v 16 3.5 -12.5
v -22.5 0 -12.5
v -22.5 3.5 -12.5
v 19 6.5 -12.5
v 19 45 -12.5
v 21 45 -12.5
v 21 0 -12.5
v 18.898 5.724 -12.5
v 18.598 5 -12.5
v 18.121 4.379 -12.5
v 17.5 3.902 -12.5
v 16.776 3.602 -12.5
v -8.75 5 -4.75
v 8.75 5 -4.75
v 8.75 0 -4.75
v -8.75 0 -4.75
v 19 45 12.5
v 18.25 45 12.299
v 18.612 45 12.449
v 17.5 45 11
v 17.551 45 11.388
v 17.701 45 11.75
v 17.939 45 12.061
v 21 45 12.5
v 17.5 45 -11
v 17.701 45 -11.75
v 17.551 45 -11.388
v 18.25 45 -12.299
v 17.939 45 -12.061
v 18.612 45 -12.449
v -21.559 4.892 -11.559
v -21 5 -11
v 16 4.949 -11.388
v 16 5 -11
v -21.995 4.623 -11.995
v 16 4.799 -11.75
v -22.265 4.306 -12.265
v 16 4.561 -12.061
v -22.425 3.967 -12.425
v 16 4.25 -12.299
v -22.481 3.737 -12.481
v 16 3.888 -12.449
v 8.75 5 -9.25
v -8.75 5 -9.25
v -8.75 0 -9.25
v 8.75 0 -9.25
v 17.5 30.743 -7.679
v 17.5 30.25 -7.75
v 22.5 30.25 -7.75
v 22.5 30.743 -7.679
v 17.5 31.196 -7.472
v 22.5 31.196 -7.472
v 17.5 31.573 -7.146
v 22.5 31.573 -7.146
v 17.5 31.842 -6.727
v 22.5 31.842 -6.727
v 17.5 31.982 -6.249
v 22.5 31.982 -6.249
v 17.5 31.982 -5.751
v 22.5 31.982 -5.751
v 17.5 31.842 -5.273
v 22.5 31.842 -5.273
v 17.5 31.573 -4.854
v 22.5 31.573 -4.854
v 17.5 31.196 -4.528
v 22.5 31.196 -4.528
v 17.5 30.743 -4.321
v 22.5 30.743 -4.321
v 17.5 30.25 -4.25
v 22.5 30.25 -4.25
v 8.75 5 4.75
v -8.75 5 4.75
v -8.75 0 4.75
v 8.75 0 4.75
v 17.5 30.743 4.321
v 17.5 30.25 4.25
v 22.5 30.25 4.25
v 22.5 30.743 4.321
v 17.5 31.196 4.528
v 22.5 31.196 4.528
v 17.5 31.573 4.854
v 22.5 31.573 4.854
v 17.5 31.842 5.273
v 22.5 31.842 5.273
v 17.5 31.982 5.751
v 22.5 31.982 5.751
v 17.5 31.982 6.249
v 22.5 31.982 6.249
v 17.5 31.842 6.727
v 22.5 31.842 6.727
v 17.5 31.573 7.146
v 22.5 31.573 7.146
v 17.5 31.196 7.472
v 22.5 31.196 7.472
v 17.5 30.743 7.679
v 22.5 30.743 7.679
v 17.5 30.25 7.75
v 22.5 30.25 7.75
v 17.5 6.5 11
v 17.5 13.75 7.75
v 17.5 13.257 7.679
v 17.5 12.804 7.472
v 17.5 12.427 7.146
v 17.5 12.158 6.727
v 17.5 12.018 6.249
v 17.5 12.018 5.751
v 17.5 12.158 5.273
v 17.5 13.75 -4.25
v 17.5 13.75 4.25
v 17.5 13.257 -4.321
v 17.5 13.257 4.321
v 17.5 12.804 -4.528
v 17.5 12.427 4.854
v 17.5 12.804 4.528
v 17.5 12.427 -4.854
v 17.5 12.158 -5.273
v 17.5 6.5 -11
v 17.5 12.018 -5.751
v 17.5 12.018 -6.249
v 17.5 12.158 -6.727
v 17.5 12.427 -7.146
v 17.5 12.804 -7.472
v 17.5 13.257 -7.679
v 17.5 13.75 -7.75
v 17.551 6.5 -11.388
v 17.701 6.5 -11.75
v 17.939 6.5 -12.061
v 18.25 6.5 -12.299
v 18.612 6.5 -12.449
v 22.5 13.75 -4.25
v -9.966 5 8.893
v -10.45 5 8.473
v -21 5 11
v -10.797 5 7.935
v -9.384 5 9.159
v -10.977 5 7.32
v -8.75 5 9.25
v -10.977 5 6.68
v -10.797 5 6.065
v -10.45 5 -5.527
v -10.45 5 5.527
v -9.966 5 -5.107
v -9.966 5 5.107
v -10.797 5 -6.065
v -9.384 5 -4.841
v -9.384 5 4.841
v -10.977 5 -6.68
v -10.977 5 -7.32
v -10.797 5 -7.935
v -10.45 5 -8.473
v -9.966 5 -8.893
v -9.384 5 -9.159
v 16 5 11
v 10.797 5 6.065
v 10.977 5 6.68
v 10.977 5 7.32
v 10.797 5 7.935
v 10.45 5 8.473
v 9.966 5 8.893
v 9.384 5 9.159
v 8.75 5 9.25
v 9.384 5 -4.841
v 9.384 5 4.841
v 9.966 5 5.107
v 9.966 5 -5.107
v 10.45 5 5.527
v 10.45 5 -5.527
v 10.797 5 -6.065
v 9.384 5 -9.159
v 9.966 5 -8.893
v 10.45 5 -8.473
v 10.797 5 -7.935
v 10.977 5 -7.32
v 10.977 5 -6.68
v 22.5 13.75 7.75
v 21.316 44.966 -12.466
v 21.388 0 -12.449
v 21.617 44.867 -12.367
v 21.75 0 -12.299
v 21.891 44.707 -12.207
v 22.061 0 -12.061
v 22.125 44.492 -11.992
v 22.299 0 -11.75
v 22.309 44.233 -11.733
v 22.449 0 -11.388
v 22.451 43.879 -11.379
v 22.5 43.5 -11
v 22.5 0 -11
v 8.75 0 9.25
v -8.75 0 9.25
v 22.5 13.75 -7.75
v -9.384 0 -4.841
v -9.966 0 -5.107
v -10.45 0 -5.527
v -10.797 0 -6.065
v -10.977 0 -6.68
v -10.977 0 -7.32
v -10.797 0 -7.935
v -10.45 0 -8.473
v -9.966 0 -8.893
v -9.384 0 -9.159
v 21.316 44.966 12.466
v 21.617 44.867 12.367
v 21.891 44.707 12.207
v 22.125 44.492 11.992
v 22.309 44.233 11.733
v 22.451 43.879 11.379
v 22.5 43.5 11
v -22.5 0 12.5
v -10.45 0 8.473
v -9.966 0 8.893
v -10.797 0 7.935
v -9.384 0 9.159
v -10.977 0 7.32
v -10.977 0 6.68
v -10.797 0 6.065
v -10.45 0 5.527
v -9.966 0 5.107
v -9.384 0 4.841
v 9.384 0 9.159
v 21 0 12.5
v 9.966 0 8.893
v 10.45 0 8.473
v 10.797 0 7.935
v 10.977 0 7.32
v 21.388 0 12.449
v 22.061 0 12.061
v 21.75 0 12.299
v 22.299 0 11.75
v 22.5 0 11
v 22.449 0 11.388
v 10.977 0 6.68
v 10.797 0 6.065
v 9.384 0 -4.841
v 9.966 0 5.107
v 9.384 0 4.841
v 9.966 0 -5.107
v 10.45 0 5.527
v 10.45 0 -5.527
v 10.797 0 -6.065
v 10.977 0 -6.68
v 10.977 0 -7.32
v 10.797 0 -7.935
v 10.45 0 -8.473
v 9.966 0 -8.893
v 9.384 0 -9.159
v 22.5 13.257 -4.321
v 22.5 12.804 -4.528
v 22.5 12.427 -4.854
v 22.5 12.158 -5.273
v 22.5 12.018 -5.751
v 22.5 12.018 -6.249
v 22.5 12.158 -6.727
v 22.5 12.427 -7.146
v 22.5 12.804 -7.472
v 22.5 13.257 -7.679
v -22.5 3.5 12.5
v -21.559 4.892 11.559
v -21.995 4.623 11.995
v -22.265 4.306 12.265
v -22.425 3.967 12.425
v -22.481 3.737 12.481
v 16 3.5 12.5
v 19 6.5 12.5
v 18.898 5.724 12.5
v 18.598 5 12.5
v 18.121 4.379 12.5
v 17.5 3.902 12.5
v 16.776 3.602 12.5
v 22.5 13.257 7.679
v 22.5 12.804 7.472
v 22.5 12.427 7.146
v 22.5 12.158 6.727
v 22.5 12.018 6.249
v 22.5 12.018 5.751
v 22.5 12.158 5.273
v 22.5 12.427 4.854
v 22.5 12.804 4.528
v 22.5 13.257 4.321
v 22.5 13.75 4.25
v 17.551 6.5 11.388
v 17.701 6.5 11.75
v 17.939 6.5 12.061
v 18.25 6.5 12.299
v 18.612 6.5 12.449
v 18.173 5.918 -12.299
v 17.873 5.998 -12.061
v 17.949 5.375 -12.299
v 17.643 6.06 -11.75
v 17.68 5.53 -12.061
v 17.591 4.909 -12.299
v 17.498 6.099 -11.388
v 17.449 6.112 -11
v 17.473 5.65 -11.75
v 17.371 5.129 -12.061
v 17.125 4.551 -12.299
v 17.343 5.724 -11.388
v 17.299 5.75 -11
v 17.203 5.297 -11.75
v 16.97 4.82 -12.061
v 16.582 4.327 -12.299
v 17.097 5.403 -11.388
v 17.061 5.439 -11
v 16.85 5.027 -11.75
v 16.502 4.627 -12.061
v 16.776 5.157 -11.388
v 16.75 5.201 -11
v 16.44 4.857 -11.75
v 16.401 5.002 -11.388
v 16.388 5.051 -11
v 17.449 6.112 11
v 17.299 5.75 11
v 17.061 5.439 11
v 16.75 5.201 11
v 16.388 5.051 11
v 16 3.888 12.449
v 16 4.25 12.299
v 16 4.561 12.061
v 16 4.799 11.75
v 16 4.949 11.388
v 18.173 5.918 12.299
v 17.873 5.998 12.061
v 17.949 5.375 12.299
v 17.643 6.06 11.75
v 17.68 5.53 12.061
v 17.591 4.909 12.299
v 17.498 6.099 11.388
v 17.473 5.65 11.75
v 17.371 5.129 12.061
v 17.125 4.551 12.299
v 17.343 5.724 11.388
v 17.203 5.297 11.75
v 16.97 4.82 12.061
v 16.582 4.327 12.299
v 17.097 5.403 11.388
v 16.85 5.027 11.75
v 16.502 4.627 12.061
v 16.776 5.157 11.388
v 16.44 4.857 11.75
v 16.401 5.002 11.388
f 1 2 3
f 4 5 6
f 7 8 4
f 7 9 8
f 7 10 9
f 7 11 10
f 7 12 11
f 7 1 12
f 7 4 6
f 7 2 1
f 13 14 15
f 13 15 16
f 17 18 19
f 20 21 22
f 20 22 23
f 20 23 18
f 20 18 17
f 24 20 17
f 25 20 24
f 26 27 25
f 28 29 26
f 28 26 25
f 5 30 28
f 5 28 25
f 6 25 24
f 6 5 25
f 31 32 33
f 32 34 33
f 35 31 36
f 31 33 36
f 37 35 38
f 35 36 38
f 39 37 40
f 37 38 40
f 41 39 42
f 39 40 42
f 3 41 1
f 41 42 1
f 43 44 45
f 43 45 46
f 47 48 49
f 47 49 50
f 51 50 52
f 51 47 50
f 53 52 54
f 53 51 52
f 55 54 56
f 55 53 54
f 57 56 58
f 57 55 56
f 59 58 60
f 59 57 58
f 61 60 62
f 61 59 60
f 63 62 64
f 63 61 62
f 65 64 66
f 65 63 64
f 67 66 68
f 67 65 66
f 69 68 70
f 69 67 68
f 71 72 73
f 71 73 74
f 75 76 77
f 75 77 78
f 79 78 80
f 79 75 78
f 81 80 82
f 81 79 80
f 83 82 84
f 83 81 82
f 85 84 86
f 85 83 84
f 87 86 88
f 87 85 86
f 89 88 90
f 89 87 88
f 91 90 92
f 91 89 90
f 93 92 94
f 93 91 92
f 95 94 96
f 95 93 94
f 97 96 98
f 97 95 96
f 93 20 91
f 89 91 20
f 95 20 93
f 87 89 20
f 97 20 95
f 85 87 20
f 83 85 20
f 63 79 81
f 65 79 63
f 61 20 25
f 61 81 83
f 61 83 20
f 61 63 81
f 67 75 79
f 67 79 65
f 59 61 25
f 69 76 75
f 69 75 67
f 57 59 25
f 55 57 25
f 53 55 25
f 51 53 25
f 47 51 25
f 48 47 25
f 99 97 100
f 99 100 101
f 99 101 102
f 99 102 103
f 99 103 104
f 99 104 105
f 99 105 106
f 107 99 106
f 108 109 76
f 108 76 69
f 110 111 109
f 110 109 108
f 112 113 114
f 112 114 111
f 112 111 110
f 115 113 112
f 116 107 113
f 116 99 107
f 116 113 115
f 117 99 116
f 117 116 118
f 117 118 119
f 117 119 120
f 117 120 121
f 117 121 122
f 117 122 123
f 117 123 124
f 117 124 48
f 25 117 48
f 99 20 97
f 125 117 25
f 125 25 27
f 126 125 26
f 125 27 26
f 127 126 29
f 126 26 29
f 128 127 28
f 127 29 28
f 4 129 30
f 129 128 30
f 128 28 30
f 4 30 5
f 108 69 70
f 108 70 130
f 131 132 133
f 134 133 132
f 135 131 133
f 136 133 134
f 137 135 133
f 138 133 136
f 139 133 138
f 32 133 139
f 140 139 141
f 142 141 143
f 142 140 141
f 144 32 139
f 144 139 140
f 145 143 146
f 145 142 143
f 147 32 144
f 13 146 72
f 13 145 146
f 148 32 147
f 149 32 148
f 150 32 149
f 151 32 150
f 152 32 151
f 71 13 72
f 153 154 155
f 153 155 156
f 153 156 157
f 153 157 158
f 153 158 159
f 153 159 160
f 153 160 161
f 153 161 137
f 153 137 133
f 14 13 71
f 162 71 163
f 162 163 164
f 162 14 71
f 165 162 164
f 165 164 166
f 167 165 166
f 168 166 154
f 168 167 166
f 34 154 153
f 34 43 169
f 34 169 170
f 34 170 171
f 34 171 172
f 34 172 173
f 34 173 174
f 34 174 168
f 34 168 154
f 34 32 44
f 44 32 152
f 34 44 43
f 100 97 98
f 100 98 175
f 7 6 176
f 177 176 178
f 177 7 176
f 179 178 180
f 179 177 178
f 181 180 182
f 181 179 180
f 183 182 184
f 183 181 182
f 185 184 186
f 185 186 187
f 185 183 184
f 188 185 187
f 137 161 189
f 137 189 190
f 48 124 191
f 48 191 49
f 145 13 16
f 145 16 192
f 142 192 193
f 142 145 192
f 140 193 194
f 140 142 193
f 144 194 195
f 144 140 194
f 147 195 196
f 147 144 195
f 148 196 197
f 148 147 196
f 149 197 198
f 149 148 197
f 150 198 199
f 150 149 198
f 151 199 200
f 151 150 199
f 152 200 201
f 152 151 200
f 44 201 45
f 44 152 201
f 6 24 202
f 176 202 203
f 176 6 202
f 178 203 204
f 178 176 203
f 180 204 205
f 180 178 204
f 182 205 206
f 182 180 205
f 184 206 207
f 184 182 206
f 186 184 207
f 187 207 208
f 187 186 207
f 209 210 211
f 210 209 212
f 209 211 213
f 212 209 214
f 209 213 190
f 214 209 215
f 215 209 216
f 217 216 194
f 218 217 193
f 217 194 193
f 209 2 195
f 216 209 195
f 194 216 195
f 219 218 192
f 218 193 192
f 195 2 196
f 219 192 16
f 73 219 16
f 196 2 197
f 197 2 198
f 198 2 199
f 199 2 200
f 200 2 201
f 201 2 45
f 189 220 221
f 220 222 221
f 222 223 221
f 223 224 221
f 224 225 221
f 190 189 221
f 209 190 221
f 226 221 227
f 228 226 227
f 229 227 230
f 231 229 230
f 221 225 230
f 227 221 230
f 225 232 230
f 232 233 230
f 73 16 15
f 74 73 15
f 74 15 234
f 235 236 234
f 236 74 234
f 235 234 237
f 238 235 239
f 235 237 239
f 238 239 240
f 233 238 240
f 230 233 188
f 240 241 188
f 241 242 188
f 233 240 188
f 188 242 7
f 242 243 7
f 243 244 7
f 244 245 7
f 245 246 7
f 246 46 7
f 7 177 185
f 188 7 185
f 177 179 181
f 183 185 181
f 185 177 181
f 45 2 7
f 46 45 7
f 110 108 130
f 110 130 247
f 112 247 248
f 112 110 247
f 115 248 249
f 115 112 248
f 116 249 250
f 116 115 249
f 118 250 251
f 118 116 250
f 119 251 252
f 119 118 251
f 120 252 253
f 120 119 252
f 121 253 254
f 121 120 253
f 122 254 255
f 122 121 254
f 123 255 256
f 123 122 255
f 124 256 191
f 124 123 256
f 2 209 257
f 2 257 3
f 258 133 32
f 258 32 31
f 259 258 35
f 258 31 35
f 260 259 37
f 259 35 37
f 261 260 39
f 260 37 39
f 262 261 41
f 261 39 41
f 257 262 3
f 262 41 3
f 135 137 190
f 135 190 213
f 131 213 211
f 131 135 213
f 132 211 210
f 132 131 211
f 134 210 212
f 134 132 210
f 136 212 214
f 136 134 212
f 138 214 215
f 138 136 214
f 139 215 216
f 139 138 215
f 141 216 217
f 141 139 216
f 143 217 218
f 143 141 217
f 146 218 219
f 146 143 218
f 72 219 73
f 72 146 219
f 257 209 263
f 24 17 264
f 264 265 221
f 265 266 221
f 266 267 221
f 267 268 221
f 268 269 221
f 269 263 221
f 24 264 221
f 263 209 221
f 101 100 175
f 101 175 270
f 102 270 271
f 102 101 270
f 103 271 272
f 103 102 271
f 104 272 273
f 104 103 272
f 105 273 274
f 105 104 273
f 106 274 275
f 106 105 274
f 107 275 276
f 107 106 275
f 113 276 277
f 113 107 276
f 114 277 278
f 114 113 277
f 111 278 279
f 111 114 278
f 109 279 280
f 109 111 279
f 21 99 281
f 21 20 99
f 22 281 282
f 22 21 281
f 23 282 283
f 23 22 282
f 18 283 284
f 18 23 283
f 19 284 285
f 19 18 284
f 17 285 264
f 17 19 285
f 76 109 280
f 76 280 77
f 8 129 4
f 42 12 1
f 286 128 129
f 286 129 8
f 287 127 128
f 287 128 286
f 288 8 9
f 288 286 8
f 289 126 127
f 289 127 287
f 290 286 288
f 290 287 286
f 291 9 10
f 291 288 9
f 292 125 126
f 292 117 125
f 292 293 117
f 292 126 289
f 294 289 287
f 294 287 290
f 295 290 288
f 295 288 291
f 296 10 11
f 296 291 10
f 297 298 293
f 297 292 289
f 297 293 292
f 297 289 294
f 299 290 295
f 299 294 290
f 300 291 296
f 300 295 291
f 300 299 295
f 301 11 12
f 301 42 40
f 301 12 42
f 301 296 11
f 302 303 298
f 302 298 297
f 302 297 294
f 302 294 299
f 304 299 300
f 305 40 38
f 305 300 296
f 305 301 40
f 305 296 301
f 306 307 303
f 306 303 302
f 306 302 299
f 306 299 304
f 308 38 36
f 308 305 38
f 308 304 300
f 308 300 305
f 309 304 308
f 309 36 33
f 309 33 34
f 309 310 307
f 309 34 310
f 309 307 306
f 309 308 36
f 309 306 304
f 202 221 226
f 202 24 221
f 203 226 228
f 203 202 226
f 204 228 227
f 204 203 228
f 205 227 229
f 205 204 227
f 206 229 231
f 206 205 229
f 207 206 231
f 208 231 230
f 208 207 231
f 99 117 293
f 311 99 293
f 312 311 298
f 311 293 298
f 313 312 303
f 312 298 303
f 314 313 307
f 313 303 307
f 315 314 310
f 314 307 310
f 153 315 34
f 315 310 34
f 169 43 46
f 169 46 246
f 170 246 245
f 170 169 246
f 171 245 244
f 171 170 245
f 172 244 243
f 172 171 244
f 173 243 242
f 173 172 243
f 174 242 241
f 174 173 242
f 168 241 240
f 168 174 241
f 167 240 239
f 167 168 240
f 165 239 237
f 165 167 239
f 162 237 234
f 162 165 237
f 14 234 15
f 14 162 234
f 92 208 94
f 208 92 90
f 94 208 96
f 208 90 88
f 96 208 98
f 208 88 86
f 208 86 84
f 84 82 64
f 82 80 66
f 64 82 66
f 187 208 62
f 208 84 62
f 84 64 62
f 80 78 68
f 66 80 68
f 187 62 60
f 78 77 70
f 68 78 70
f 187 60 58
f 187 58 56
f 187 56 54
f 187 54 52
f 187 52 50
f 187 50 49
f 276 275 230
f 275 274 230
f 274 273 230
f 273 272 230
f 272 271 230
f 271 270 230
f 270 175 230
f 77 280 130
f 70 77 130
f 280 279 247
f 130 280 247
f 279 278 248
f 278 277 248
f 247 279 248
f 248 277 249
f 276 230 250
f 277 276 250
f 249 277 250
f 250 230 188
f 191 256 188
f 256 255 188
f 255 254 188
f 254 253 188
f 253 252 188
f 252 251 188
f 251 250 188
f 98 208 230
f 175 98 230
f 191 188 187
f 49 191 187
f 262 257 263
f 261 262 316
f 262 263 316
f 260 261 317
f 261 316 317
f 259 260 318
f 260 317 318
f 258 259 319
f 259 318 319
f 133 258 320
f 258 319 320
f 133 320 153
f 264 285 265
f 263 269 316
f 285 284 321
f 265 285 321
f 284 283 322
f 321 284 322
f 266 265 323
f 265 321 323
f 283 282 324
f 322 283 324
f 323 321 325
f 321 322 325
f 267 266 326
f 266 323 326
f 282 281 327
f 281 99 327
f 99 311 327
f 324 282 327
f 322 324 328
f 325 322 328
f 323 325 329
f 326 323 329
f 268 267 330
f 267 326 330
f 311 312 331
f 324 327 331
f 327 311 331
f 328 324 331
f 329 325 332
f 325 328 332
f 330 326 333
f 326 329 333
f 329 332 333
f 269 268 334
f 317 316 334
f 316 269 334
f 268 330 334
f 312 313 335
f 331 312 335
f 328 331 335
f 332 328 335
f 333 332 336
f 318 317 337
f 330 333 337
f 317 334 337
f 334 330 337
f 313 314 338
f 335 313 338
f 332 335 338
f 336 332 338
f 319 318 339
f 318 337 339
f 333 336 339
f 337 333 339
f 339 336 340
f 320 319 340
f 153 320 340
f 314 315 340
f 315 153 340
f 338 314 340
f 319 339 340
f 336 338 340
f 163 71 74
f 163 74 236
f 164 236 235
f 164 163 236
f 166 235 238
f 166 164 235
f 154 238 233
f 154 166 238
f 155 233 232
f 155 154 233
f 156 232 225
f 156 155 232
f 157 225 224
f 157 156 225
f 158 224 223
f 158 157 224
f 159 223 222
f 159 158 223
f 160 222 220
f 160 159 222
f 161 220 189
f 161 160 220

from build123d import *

# Parameters (mm, degrees)
SKETCH2_W           = 45
SKETCH2_H           = 25
BOSS_EXTRUDE1_DEPTH = 5
CUT_EXTRUDE1_DEPTH  = 27.220221204
SKETCH5_W           = 5
SKETCH5_H           = 25
BOSS_EXTRUDE2_DEPTH = 40
CUT_EXTRUDE2_DEPTH  = 62.491869381
FILLET2_R           = 1.5


with BuildPart() as part:
    # Sketch2 → Boss-Extrude1 (new body)
    with BuildSketch(Plane(origin=(0, 0, 0), x_dir=(1, 0, 0), z_dir=(0, 1, 0))):
        Rectangle(SKETCH2_W, SKETCH2_H)
    extrude(amount=BOSS_EXTRUDE1_DEPTH)

    # Sketch3 → Cut-Extrude1 (cut, through all)
    with BuildSketch(Plane(origin=(0, 5, 0), x_dir=(1, 0, 0), z_dir=(0, 1, 0))):
        with BuildLine():
            Line((-8.75, 9.25), (8.75, 9.25))
            ThreePointArc((8.75, 9.25), (11, 7), (8.75, 4.75))
            Line((8.75, 4.75), (-8.75, 4.75))
            ThreePointArc((-8.75, 4.75), (-11, 7), (-8.75, 9.25))
        make_face()
        with BuildLine():
            Line((-8.75, -4.75), (8.75, -4.75))
            ThreePointArc((8.75, -4.75), (11, -7), (8.75, -9.25))
            Line((8.75, -9.25), (-8.75, -9.25))
            ThreePointArc((-8.75, -9.25), (-11, -7), (-8.75, -4.75))
        make_face()
    extrude(amount=-CUT_EXTRUDE1_DEPTH, mode=Mode.SUBTRACT)

    # Sketch5 → Boss-Extrude2 (add)
    with BuildSketch(Plane(origin=(0, 5, 0), x_dir=(1, 0, 0), z_dir=(0, 1, 0))):
        with Locations((20, 0)):
            Rectangle(SKETCH5_W, SKETCH5_H)
    extrude(amount=BOSS_EXTRUDE2_DEPTH)

    # Sketch6 → Cut-Extrude2 (cut, through all)
    with BuildSketch(Plane.ZY.offset(-17.5)):
        with BuildLine():
            Line((-4.25, 30.25), (-4.25, 13.75))
            ThreePointArc((-4.25, 13.75), (-6, 12), (-7.75, 13.75))
            Line((-7.75, 13.75), (-7.75, 30.25))
            ThreePointArc((-7.75, 30.25), (-6, 32), (-4.25, 30.25))
        make_face()
        with BuildLine():
            Line((7.75, 30.25), (7.75, 13.75))
            ThreePointArc((7.75, 13.75), (6, 12), (4.25, 13.75))
            Line((4.25, 13.75), (4.25, 30.25))
            ThreePointArc((4.25, 30.25), (6, 32), (7.75, 30.25))
        make_face()
    extrude(amount=-CUT_EXTRUDE2_DEPTH, mode=Mode.SUBTRACT)

    # Fillet2
    fillet2_edges = [part.edges().sort_by_distance(p)[0] for p in [
        (-22.5, 5, 0),
        (-2.5, 5, 12.5),
        (-2.5, 5, -12.5),
        (17.5, 5, 0),
        (17.5, 25, -12.5),
        (17.5, 25, 12.5),
        (22.5, 45, 0),
        (22.5, 22.5, 12.5),
        (22.5, 22.5, -12.5),
    ]]
    fillet(fillet2_edges, radius=FILLET2_R)


solid = part.part
